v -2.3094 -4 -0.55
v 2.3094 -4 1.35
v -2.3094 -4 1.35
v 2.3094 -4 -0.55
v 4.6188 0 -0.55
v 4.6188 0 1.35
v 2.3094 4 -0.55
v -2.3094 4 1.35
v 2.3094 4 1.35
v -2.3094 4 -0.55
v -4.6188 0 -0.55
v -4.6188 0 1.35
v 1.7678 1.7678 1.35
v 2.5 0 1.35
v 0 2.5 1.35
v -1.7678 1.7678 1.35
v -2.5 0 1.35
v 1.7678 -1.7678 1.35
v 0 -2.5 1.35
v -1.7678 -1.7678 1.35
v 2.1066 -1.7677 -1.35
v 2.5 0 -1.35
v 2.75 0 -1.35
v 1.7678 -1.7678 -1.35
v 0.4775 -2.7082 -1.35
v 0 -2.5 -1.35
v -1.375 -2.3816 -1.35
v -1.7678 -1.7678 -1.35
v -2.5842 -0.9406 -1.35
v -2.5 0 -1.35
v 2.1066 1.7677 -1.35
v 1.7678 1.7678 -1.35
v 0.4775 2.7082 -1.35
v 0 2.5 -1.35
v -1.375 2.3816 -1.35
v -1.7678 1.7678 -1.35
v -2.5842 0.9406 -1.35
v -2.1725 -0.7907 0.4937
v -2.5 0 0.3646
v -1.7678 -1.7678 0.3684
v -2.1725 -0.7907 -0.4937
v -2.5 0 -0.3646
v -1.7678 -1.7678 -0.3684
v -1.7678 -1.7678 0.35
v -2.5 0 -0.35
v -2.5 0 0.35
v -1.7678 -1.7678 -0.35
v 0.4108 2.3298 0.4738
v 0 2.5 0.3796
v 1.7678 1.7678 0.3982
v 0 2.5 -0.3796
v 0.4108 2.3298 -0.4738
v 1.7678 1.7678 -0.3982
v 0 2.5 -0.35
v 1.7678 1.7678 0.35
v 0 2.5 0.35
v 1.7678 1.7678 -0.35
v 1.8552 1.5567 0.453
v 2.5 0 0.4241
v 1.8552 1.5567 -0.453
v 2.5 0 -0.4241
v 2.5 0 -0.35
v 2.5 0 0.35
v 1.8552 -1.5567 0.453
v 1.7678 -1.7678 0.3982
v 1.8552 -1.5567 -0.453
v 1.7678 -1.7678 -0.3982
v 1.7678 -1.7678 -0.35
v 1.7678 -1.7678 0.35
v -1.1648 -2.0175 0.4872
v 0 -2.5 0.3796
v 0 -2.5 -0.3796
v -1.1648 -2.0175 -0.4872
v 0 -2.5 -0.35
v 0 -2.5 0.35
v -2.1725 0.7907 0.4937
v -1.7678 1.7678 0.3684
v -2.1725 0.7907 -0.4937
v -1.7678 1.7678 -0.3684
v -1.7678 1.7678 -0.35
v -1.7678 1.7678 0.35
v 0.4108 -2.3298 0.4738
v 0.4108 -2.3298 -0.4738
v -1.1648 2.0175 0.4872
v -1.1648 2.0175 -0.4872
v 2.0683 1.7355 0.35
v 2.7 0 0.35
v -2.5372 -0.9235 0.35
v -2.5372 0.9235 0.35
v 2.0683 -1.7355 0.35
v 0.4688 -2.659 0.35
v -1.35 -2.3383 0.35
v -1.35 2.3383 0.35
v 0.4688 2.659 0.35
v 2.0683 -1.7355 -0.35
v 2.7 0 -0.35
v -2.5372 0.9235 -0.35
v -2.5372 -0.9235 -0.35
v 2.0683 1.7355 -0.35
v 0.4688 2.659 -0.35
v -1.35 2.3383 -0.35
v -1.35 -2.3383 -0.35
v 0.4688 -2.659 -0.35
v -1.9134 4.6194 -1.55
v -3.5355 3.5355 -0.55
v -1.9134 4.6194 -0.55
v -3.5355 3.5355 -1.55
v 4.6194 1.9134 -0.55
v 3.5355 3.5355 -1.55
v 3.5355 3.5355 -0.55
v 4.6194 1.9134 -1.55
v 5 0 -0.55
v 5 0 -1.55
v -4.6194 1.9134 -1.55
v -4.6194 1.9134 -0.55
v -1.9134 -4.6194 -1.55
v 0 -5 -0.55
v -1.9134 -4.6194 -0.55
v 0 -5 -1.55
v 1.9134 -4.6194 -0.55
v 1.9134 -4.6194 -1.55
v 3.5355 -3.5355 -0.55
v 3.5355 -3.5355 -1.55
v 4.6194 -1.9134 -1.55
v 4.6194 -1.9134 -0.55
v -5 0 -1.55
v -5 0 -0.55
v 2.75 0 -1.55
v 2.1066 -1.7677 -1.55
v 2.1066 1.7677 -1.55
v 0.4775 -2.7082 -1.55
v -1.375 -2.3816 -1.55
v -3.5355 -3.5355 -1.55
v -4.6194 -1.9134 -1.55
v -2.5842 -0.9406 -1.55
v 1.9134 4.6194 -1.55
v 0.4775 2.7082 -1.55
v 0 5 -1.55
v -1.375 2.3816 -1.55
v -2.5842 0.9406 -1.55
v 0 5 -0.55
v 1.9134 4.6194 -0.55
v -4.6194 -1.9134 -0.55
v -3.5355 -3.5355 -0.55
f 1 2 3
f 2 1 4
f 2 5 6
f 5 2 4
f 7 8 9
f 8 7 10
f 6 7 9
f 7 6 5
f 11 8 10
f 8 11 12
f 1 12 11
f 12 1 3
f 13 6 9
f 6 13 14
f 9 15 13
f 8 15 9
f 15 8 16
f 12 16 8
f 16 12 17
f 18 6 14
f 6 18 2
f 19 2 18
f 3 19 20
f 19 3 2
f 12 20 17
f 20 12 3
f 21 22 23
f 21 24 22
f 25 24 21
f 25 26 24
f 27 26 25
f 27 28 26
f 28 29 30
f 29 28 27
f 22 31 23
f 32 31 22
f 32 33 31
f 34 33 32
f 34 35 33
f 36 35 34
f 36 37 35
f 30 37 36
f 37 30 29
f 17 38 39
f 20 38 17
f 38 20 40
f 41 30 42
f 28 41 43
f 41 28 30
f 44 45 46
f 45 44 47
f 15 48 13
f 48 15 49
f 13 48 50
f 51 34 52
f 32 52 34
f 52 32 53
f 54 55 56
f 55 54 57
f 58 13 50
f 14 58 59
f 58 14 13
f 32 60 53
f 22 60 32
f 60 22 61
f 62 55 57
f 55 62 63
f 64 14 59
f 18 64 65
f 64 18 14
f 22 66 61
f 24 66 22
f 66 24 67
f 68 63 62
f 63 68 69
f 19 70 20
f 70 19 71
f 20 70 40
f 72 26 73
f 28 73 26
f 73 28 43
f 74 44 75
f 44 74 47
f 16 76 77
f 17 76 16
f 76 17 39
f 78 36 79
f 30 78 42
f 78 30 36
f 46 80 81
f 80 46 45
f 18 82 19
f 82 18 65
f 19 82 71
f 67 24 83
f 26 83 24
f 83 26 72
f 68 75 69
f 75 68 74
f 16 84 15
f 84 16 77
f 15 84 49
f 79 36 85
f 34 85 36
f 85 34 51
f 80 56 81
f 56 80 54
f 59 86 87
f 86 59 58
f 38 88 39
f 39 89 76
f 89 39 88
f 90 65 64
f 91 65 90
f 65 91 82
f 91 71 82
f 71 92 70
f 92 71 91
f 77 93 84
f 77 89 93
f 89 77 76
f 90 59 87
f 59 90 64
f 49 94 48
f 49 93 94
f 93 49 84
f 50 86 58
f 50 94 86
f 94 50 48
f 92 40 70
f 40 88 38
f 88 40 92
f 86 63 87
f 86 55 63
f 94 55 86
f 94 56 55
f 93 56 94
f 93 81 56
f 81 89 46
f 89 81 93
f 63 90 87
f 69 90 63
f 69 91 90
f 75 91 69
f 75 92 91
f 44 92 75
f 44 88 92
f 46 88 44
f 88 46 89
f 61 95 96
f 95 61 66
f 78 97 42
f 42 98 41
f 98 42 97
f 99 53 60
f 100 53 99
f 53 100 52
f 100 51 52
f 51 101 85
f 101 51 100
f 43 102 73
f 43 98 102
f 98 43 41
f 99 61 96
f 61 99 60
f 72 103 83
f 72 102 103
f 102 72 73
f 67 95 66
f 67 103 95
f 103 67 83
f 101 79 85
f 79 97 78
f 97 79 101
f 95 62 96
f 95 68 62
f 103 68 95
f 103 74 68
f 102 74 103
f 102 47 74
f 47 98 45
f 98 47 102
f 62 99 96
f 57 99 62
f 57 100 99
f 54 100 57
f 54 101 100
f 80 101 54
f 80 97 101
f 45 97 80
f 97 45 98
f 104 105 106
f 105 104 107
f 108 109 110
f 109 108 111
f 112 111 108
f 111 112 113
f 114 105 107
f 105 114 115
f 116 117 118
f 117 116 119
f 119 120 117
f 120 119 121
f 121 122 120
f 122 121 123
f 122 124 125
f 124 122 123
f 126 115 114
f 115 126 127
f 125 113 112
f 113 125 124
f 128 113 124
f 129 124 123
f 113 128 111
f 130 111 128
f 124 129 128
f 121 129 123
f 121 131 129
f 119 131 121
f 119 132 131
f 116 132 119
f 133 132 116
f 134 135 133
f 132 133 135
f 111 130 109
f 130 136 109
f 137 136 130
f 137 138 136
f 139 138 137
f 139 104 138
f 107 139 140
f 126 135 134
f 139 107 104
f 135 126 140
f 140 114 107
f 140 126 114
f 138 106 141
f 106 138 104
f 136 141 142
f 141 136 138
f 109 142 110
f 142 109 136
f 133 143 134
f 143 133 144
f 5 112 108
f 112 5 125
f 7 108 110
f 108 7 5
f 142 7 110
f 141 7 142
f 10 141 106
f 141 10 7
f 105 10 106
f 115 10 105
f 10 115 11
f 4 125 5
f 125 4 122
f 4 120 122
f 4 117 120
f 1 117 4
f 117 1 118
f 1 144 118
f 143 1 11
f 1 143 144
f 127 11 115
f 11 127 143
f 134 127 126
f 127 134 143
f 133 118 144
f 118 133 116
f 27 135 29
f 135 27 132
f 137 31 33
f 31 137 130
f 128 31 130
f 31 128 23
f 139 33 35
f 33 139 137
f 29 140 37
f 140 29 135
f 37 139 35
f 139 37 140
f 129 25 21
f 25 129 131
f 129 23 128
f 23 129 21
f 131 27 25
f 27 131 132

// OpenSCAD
// Parameters
thread_diameter = 5; //[2.5:10:0.1]
thread_pitch = 0.8; //[0.4:1.6:0.05]
across_flats = 8; //[4:16:0.1]
thickness = 2.7; //[1.35:5.4:0.05]
chamfer = 0.2; //[0.1:0.6:0.05]
tolerance_hole_diameter = 0; //[-0.2:0.4:0.01]
overlap = 0.8; //[0.5:2:0.1]
washer_outer_diameter = 10; //[6:20:0.1]
washer_thickness = 1; //[0.5:2:0.05]
washer_hole_extra_diameter = 0.5; //[0.2:1.5:0.05]

// Hex Nut with Washer
module nut_and_washer() {
  color("DimGray") {
    union() {
      // Hex Nut Body
      difference() {
        translate([0, 0, 0])
          cylinder(h=thickness, r=(across_flats/2)/cos(30), center=true, $fn=6);
        // Central Threaded Hole
        translate([0, 0, 0])
          cylinder(h=thickness + 2*overlap, r=(thread_diameter + tolerance_hole_diameter)/2, center=true);
        // Top Face Chamfer Cut
        translate([0, 0, thickness/2 - (chamfer + overlap)/2])
          cylinder(h=chamfer + overlap, r1=(thread_diameter + tolerance_hole_diameter)/2 + chamfer, r2=0, center=true);
        // Bottom Face Chamfer Cut
        translate([0, 0, -thickness/2 + (chamfer + overlap)/2])
          rotate([180, 0, 0])
          cylinder(h=chamfer + overlap, r1=(thread_diameter + tolerance_hole_diameter)/2 + chamfer, r2=0, center=true);
      }
      // Washer
      difference() {
        translate([0, 0, -thickness/2 - washer_thickness/2 + overlap])
          cylinder(h=washer_thickness, r=washer_outer_diameter/2, center=true);
        translate([0, 0, -thickness/2 - washer_thickness/2 + overlap])
          cylinder(h=washer_thickness + 2*overlap, r=(thread_diameter + washer_hole_extra_diameter)/2, center=true);
      }
    }
  }
}

// Assembly
module assembly() {
  nut_and_washer();
}

assembly();
